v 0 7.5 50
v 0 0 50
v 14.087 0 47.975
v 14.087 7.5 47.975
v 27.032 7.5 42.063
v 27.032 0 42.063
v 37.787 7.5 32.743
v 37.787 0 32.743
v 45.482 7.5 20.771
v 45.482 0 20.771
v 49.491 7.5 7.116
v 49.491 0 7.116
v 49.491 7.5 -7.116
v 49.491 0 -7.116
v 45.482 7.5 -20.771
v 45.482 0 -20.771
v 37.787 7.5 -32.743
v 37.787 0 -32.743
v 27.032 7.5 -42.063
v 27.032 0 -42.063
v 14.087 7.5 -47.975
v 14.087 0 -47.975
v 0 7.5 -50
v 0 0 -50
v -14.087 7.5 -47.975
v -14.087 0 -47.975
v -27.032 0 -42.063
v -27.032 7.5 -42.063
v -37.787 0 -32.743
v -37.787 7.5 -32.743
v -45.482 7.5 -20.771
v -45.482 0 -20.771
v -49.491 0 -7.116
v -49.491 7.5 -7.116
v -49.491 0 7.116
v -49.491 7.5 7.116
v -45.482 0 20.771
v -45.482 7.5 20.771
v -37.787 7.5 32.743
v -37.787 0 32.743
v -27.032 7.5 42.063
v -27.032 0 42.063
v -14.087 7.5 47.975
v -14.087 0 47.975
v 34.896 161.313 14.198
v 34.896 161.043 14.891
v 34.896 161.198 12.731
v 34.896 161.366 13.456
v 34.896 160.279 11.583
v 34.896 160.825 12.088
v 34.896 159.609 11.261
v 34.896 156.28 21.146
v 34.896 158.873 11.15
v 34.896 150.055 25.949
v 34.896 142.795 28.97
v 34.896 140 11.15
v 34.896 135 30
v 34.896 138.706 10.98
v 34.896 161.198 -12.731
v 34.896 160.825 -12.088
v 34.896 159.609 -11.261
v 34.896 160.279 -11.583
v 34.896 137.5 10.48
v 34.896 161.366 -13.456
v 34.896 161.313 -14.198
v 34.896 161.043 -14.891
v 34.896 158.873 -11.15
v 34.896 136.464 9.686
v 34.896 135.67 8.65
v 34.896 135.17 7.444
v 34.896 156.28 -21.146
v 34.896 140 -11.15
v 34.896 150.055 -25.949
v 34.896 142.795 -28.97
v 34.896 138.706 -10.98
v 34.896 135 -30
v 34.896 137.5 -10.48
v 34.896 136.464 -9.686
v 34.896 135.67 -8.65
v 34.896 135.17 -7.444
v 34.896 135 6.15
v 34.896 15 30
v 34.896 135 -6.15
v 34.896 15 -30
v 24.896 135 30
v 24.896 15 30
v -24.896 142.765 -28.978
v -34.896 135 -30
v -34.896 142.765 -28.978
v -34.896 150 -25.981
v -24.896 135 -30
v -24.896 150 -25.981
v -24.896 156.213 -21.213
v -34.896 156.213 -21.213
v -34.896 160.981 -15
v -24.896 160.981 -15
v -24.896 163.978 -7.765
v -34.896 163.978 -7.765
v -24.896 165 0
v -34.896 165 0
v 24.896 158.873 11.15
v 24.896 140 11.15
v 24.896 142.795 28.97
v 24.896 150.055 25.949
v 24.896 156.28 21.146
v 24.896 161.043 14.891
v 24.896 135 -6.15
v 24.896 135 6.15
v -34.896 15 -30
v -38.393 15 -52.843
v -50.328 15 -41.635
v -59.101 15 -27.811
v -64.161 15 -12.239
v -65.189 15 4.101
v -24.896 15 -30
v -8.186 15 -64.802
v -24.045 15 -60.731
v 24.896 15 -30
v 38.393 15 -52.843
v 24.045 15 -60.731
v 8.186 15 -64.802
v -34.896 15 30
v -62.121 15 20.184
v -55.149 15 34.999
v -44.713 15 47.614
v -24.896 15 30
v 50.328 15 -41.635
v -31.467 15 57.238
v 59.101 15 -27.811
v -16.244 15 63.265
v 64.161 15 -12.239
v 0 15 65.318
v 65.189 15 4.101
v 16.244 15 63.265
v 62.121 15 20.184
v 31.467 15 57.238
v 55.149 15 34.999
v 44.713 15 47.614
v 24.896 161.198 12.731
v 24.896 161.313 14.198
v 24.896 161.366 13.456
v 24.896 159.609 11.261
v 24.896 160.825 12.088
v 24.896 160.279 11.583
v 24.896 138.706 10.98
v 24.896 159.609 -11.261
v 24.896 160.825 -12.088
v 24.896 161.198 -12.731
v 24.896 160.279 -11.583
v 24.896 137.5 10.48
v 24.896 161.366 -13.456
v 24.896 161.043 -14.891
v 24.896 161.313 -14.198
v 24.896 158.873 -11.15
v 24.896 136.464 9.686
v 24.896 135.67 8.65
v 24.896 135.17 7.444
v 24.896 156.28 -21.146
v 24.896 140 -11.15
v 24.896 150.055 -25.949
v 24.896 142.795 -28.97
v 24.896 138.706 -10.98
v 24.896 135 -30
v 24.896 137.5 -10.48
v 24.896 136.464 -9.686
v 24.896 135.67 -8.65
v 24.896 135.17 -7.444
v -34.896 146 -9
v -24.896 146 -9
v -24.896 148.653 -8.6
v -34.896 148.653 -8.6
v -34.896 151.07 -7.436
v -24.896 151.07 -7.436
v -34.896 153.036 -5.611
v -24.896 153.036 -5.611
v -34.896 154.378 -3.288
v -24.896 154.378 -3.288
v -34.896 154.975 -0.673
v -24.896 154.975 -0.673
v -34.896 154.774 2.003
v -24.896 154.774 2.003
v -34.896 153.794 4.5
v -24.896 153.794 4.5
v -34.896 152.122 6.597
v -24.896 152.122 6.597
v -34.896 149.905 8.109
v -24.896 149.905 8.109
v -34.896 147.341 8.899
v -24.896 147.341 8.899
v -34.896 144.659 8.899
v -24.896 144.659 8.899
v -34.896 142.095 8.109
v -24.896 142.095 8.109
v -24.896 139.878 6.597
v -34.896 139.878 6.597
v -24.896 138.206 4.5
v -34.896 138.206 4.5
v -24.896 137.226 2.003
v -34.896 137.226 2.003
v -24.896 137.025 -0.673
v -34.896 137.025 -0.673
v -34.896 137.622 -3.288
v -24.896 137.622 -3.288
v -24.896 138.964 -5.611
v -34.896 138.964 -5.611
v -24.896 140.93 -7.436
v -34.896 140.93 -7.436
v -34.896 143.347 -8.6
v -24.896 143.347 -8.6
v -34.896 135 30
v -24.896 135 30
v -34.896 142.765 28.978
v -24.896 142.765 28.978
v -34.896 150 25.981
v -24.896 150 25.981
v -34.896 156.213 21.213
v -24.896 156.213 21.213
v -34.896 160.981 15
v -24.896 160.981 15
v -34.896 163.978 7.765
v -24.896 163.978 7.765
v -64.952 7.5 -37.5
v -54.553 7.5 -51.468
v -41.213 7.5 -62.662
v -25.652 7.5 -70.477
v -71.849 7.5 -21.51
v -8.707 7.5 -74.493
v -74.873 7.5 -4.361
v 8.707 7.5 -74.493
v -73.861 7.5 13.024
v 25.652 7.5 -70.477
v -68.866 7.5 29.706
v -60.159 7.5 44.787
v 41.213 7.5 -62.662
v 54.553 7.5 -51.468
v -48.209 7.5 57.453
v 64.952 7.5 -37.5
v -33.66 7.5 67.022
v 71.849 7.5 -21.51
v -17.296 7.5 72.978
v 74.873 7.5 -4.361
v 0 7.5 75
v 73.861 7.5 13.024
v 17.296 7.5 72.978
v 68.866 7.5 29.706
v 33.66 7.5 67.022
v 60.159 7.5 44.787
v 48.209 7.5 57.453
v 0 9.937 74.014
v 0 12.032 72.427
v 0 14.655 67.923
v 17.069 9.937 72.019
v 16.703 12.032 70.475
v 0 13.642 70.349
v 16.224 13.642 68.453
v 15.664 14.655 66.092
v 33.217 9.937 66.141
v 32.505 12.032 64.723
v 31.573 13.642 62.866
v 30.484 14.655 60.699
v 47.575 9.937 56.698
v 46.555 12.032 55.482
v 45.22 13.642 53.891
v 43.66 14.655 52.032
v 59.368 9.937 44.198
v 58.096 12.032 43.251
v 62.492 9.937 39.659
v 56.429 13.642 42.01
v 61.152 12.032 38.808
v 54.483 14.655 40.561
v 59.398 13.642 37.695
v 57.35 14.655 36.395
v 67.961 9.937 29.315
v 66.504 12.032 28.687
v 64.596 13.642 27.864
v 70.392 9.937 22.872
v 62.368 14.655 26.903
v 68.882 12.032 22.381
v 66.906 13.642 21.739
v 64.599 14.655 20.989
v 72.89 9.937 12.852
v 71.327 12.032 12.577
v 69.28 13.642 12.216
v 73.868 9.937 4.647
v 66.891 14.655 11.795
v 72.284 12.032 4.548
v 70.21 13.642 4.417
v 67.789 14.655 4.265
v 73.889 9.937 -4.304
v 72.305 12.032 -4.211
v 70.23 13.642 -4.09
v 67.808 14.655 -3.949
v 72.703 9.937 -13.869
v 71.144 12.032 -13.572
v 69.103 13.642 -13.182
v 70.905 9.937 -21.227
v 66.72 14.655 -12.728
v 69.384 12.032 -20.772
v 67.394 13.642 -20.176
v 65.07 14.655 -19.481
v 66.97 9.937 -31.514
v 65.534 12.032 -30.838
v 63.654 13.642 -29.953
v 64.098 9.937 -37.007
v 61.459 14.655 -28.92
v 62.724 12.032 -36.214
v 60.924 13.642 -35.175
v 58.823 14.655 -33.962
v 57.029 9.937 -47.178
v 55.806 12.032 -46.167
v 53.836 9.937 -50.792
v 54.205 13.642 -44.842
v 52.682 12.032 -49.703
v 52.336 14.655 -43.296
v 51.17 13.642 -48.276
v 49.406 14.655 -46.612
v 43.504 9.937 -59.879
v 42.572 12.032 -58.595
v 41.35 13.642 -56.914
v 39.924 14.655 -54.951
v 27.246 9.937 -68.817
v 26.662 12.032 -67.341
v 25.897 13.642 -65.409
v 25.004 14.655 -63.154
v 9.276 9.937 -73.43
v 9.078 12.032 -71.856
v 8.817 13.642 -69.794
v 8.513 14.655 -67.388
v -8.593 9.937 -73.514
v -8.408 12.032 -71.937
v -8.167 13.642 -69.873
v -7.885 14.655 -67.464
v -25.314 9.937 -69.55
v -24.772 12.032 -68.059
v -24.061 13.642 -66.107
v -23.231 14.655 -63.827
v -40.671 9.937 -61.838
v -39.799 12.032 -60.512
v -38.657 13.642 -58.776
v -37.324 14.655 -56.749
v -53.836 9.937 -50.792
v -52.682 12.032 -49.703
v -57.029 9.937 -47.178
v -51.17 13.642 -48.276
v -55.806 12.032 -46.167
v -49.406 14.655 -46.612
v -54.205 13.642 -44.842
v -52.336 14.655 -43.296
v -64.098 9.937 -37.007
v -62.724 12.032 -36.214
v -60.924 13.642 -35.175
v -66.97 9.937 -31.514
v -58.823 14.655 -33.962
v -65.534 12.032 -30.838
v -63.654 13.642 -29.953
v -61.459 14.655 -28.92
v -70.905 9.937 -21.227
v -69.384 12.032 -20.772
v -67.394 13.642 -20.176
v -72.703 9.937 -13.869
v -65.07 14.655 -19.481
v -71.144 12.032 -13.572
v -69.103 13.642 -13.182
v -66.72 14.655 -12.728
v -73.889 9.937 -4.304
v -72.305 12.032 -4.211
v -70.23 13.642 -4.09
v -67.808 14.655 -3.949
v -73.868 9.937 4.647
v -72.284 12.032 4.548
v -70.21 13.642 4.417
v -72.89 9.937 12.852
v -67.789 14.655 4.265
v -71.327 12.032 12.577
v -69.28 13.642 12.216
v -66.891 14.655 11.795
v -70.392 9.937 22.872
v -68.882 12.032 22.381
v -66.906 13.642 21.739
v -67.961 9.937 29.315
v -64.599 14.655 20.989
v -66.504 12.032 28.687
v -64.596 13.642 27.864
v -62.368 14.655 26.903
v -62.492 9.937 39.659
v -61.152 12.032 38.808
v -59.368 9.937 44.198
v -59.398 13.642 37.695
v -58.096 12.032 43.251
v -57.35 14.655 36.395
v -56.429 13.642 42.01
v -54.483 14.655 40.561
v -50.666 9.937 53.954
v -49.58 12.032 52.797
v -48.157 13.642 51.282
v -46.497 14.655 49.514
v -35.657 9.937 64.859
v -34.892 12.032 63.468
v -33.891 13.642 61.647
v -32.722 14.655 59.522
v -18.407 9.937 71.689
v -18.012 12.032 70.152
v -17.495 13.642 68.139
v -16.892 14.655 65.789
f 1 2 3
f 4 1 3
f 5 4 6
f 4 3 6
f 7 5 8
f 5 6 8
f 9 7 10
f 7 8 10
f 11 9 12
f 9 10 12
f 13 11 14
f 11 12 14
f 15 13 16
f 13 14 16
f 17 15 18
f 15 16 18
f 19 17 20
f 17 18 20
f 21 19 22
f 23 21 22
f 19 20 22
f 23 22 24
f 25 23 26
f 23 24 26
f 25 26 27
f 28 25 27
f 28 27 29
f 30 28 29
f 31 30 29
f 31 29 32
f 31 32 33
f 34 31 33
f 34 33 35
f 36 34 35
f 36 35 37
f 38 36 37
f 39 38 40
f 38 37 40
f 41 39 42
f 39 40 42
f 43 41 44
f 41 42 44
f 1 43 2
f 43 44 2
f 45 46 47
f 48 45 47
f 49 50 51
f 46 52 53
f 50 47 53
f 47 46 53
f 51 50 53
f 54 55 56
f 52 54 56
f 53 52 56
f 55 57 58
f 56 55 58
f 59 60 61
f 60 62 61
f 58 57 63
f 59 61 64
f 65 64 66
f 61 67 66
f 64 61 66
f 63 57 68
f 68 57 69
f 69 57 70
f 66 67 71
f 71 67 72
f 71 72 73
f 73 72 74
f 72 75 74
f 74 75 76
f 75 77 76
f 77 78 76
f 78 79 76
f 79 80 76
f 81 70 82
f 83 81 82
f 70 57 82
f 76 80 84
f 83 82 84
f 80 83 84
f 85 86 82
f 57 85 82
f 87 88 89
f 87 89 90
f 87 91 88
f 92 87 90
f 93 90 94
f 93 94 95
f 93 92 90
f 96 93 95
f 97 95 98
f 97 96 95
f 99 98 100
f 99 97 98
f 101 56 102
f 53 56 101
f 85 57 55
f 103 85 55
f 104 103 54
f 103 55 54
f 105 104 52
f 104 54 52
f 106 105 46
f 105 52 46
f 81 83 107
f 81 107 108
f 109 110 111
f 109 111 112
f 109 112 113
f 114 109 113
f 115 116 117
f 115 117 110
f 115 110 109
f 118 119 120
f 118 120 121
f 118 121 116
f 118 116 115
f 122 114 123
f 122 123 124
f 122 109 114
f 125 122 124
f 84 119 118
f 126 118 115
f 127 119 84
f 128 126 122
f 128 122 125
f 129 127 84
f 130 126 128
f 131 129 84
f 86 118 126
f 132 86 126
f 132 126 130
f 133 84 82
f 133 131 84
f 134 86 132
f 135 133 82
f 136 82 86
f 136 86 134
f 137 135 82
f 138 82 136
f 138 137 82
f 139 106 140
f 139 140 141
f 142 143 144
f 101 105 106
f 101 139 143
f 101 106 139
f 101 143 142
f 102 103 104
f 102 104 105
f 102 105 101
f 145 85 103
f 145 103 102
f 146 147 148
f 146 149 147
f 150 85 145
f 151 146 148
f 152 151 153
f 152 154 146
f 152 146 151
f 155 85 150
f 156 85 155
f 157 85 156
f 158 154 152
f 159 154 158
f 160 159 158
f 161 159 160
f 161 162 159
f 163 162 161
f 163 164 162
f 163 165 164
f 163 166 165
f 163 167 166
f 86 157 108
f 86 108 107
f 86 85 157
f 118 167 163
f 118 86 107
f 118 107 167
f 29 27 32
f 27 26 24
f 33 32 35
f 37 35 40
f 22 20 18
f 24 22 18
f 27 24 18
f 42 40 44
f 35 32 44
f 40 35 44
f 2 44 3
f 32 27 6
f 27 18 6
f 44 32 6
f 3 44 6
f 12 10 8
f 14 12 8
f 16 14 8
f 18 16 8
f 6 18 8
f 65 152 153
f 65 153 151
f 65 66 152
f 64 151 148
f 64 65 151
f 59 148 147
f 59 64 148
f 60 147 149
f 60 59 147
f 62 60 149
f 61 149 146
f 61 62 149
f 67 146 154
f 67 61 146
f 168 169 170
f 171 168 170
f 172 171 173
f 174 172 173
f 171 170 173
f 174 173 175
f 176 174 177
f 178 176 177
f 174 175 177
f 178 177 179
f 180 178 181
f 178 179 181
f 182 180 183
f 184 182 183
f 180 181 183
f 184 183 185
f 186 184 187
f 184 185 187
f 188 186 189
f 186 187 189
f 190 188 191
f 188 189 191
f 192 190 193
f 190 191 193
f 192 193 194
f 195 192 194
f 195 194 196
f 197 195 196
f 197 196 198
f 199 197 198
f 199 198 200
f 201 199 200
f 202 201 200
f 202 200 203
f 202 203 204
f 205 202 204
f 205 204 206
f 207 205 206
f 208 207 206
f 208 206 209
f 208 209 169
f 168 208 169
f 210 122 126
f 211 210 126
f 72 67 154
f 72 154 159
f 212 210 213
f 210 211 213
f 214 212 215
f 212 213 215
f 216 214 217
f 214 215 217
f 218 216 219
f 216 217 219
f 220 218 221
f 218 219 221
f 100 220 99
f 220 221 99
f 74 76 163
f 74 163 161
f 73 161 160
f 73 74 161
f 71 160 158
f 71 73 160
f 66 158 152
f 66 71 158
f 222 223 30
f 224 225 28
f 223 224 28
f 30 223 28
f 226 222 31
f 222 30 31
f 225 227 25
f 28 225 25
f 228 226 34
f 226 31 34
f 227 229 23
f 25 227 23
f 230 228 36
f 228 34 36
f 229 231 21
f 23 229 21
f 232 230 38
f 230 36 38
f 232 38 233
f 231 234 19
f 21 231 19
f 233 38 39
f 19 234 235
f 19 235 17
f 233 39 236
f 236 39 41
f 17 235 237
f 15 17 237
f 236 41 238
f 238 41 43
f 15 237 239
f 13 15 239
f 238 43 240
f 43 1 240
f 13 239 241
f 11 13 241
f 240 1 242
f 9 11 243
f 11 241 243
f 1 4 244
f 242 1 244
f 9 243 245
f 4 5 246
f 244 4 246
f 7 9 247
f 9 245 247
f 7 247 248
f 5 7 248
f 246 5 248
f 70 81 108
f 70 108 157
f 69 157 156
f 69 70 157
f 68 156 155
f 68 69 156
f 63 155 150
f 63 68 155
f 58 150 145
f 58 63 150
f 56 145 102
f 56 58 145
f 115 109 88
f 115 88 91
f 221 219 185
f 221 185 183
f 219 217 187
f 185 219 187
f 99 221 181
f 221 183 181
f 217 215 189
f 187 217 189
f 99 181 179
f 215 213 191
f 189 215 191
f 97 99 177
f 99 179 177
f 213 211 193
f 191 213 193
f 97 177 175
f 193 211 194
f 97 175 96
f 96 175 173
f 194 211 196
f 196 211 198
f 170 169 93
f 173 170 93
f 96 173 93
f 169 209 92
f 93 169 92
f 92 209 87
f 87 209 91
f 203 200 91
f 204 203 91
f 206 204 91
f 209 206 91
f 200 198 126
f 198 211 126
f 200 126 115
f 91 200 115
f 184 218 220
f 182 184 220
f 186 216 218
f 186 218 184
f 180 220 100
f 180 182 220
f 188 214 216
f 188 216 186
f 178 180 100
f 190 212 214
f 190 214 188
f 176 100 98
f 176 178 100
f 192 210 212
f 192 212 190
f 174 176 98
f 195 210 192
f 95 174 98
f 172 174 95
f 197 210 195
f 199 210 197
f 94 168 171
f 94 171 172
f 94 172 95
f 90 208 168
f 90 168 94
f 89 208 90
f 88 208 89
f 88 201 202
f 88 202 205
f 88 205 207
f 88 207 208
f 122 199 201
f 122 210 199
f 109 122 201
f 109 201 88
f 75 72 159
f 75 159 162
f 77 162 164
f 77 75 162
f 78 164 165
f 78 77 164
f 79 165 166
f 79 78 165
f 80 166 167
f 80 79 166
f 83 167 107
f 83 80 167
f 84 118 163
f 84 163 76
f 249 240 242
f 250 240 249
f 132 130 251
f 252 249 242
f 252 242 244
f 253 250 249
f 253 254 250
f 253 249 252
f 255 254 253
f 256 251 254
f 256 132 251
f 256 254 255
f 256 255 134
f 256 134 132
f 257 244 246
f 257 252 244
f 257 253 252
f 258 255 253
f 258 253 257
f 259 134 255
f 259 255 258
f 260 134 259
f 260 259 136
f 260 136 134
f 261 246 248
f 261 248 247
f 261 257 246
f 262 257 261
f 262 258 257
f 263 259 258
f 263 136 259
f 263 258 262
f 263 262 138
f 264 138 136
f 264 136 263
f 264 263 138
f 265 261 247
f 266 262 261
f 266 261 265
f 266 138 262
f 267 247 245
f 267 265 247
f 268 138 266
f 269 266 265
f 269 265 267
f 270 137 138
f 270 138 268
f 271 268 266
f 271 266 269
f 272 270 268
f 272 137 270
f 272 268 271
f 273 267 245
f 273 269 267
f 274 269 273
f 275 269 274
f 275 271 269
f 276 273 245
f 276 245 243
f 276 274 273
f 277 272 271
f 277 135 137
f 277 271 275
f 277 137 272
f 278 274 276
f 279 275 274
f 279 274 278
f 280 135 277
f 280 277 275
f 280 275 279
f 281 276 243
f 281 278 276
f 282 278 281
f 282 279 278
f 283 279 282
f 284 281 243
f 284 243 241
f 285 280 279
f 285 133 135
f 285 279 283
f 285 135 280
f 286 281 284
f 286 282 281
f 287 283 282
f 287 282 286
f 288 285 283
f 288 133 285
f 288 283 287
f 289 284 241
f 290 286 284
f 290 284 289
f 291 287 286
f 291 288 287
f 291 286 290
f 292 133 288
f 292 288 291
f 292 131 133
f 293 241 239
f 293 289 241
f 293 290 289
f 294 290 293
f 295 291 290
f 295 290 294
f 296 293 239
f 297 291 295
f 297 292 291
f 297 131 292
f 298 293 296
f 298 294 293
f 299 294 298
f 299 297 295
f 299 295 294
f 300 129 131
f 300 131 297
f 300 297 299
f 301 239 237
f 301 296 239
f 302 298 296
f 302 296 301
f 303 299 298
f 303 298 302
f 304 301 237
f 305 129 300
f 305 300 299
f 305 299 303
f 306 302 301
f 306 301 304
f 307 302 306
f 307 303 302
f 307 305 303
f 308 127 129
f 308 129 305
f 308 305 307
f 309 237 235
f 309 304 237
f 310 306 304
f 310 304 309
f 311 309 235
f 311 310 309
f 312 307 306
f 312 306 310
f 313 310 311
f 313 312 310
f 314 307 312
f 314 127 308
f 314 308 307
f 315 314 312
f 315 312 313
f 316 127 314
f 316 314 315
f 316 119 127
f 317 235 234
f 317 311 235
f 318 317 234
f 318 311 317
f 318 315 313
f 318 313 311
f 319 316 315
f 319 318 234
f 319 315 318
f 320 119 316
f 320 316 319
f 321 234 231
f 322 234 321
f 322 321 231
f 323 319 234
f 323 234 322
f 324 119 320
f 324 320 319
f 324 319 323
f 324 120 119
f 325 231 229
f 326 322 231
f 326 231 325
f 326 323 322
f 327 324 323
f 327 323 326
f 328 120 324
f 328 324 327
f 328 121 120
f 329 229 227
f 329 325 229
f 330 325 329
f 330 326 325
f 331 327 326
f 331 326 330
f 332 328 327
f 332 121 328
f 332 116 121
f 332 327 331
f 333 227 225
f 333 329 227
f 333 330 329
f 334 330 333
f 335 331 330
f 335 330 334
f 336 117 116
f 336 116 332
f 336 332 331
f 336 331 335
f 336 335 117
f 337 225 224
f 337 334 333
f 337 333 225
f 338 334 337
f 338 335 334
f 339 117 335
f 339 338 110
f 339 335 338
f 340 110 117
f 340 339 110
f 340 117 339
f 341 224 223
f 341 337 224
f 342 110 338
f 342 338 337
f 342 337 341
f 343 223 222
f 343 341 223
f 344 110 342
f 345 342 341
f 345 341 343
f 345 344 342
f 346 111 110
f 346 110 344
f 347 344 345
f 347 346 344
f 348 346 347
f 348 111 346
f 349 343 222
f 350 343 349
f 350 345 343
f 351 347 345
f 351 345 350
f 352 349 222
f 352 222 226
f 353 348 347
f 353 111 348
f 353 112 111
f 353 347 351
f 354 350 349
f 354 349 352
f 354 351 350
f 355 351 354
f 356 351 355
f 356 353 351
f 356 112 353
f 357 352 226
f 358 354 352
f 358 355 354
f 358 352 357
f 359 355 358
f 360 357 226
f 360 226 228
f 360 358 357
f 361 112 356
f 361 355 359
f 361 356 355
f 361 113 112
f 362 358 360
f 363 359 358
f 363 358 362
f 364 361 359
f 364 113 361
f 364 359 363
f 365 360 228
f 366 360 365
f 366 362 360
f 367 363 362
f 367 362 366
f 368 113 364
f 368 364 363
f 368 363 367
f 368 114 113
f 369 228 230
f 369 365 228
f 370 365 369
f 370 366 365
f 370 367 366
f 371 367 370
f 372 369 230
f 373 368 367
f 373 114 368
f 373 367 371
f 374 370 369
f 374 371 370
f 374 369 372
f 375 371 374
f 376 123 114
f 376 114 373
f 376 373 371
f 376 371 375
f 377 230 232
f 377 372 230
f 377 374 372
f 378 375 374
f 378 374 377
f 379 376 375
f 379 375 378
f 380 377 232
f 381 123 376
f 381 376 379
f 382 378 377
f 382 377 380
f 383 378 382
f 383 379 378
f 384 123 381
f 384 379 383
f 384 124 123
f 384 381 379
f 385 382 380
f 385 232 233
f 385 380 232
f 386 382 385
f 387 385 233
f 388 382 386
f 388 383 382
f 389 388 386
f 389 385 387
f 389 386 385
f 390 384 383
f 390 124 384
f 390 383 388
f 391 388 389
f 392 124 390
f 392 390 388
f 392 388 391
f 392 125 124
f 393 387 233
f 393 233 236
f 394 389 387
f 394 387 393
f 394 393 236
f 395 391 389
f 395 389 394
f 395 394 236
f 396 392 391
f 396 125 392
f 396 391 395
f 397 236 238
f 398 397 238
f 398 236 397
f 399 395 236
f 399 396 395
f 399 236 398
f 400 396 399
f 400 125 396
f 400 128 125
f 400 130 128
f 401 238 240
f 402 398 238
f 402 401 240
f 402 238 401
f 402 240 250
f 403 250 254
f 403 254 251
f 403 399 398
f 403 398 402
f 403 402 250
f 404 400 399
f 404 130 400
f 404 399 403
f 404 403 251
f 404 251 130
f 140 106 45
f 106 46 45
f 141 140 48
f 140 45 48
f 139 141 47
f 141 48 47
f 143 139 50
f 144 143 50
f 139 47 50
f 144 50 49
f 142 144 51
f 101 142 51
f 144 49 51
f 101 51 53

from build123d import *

# Parameters (mm, degrees)
SKETCH1_R           = 50
BOSS_EXTRUDE1_DEPTH = 7.5
SKETCH2_R           = 75
BOSS_EXTRUDE2_DEPTH = 7.5
SKETCH3_W           = 10
SKETCH3_H           = 60
BOSS_EXTRUDE3_DEPTH = 150
FILLET1_R           = 30
FILLET2_R           = 10
CUT_EXTRUDE1_DEPTH  = 10
FILLET3_R           = 2.5
SKETCH5_R           = 9
CUT_EXTRUDE6_DEPTH  = 212.960382158


# Some blends are built 0.0001 mm under size
with BuildPart() as part:
    # Sketch1 → Boss-Extrude1 (new body)
    with BuildSketch(Plane(origin=(0, 0, 0), x_dir=(1, 0, 0), z_dir=(0, 1, 0))):
        with Locations(Location((0, 0, 0), (0, 0, 270))):
            Circle(SKETCH1_R)
    extrude(amount=BOSS_EXTRUDE1_DEPTH)

    # Sketch2 → Boss-Extrude2 (add)
    with BuildSketch(Plane(origin=(0, 7.5, 0), x_dir=(1, 0, 0), z_dir=(0, 1, 0))):
        with Locations(Location((0, 0, 0), (0, 0, 270))):
            Circle(SKETCH2_R)
    extrude(amount=BOSS_EXTRUDE2_DEPTH)

    # Sketch3 → Boss-Extrude3 (add)
    with BuildSketch(Plane(origin=(0, 15, 0), x_dir=(1, 0, 0), z_dir=(0, 1, 0))):
        with Locations((29.896331169, 0)):
            Rectangle(SKETCH3_W, SKETCH3_H)
        with Locations((-29.896331169, 0)):
            Rectangle(SKETCH3_W, SKETCH3_H)
    extrude(amount=BOSS_EXTRUDE3_DEPTH)

    # Fillet1
    fillet1_edges = [part.edges().sort_by_distance(p)[0] for p in [
        (29.896331169, 165, 30),
        (-29.896331169, 165, 30),
        (-29.896331169, 165, -30),
        (29.896331169, 165, -30),
    ]]
    fillet(fillet1_edges, radius=FILLET1_R - 0.0001)  # a hair under: the kernel refuses the full size

    # Fillet2
    # the kernel refuses this fillet: 10 mm, written as the material it takes off along each edge
    with BuildSketch(Plane(origin=(0, 15, 0), x_dir=(0, 0, 1), z_dir=(-1, 0, 0))) as fillet2_piece_1:
        with BuildLine():
            CenterArc((65.317541634, -10), FILLET2_R, 14.477512186, 75.522487814)
            Line((75, -7.5), (75.193649167, -7.45))
            ThreePointArc((75.193649167, -7.45), (75.2, -3.75), (75.2, 0))
            Line((75.2, 0), (75, 0.2))
            Line((75, 0.2), (65.317541634, 0.2))
            Line((65.317541634, 0.2), (65.317541634, 0))
        make_face()
    revolve(axis=Axis((0, 15, 0), (0, 1, 0)), mode=Mode.SUBTRACT)

    # Sketch4 → Cut-Extrude1 (cut)
    with BuildSketch(Plane(origin=(34.896331169, 0, 0), x_dir=(0, 0, -1), z_dir=(1, 0, 0))):
        with BuildLine():
            Line((-11.15, 195), (11.15, 195))
            Line((11.15, 195), (11.15, 140))
            ThreePointArc((11.15, 140), (9.685533906, 136.464466094), (6.15, 135))
            Line((6.15, 135), (-6.15, 135))
            ThreePointArc((-6.15, 135), (-9.685533906, 136.464466094), (-11.15, 140))
            Line((-11.15, 140), (-11.15, 195))
        make_face()
    extrude(amount=-CUT_EXTRUDE1_DEPTH, mode=Mode.SUBTRACT)

    # Fillet3
    fillet3_edges = [part.edges().sort_by_distance(p)[0] for p in [
        (29.896331169, 162.851019733, 11.15),
        (29.896331169, 162.851019733, -11.15),
    ]]
    fillet(fillet3_edges, radius=FILLET3_R)

    # Sketch5 → Cut-Extrude6 (cut, through all)
    with BuildSketch(Plane(origin=(34.896331169, 0, 0), x_dir=(0, 0, -1), z_dir=(1, 0, 0))):
        with Locations((0, 146)):
            Circle(SKETCH5_R)
    extrude(amount=-CUT_EXTRUDE6_DEPTH, mode=Mode.SUBTRACT)


solid = part.part
